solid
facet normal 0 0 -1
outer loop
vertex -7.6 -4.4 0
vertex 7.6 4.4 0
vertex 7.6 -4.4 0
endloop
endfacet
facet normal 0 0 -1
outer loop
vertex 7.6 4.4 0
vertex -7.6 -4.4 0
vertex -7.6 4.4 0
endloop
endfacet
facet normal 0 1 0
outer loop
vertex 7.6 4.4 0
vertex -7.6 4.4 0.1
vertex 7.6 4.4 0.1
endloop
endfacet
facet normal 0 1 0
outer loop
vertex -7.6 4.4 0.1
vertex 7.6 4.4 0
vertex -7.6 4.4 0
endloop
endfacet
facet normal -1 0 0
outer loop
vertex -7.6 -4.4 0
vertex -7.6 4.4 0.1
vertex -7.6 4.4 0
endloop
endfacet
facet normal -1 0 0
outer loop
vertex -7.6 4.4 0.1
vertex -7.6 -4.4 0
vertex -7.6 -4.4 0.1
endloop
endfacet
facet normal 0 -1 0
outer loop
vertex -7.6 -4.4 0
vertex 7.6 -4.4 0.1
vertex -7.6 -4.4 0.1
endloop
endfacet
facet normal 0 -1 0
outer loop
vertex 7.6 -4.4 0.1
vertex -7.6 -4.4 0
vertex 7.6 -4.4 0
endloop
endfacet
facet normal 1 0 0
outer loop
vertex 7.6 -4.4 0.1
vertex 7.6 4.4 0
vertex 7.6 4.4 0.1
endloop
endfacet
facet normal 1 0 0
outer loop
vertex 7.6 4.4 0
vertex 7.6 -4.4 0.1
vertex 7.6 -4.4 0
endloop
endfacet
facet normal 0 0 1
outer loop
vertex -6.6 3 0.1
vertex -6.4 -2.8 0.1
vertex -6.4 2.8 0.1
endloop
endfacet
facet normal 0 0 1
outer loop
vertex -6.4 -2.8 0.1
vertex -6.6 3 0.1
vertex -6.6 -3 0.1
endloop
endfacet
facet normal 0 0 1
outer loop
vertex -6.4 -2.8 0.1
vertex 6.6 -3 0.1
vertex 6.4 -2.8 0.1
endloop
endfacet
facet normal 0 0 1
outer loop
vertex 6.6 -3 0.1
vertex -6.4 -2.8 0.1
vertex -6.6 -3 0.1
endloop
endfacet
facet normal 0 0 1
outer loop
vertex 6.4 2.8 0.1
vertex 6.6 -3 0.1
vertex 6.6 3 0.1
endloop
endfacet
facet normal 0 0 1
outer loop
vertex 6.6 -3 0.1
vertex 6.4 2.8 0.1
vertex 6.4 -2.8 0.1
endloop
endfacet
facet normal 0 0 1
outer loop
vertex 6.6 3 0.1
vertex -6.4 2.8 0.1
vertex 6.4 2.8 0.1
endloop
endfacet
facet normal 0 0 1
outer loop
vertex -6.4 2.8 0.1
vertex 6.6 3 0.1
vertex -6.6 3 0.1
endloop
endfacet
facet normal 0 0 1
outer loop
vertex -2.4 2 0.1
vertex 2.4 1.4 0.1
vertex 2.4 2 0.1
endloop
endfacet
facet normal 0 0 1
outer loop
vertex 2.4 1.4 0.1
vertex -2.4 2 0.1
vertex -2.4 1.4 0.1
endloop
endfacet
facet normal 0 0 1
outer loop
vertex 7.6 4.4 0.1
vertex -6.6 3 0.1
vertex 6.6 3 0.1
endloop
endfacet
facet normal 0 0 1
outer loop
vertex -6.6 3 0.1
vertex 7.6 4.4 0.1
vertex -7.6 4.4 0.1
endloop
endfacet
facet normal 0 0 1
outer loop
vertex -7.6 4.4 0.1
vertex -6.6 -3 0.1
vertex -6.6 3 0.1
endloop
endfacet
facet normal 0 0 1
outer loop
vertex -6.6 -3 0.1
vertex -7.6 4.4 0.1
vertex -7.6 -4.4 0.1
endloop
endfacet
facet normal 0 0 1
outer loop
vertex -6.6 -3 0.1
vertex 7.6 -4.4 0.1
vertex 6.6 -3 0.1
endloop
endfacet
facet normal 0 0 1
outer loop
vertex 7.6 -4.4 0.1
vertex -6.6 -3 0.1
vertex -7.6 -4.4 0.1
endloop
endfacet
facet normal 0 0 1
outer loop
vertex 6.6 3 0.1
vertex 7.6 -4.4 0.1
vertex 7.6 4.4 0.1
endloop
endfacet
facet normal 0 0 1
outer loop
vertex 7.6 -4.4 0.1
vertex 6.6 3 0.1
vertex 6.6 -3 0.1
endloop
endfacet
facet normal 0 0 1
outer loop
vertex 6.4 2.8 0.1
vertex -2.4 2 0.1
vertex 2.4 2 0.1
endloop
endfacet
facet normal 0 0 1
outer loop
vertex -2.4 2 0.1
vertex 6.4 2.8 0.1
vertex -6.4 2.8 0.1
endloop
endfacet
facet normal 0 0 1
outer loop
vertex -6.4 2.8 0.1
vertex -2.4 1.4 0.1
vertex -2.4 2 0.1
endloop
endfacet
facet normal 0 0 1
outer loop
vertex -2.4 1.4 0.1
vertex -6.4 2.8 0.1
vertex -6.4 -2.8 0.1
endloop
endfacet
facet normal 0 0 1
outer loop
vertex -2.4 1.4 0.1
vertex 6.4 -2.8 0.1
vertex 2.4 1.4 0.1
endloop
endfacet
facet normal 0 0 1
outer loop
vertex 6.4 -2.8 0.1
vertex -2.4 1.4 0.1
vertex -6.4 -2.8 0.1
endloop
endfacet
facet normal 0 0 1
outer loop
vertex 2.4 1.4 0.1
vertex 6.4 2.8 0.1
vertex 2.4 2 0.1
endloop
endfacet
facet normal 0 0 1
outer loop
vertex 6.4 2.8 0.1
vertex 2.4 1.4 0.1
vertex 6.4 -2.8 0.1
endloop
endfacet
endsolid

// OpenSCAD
// file: ../p/box5-12.scad
use <../lib.scad>
function ldraw_lib__box5_12() = [
// 0 Box with 5 Faces without Any Edges
// 0 Name: box5-12.dat
// 0 Author: Chris Dee [cwdee]
// 0 !LDRAW_ORG Primitive UPDATE 2009-02
// 0 !LICENSE Licensed under CC BY 4.0 : see CAreadme.txt
// 
// 0 BFC CERTIFY CCW
  [0,"BFC","CERTIFY"],
  [0,"BFC","CCW"],
// 
// 0 !HISTORY 2009-09-03 [PTadmin] Official Update 2009-02
// 
// 
// 4 16 1 1 1 1 1 -1 -1 1 -1 -1 1 1
  [4,16,1,1,1,1,1,-1,-1,1,-1,-1,1,1],
// 4 16 -1 0 1 1 0 1 1 1 1 -1 1 1
  [4,16,-1,0,1,1,0,1,1,1,1,-1,1,1],
// 4 16 -1 0 -1 -1 0 1 -1 1 1 -1 1 -1
  [4,16,-1,0,-1,-1,0,1,-1,1,1,-1,1,-1],
// 4 16 1 0 -1 -1 0 -1 -1 1 -1 1 1 -1
  [4,16,1,0,-1,-1,0,-1,-1,1,-1,1,1,-1],
// 4 16 1 0 1 1 0 -1 1 1 -1 1 1 1
  [4,16,1,0,1,1,0,-1,1,1,-1,1,1,1],
// 0
];
module ldraw_lib__box5_12(step=0, col=false, unit=2/5, alt=false, line=0.2, solid=!$preview)
    makepoly(ldraw_lib__box5_12(), step=step, col=col, unit=unit, alt=alt, line=line, solid=solid);
ldraw_lib__box5_12(line=0.2);
// main file
use <../lib.scad>
use <../p/box5-12.scad>
function ldraw_lib__194325c() = [
// 0 Sticker  1.1 x  1.9 with Black Drawer on Transparent Background
// 0 Name: 194325c.dat
// 0 Author: Takeshi Takahashi [RainbowDolphin]
// 0 !LDRAW_ORG Part UPDATE 2024-08
// 0 !LICENSE Licensed under CC BY 4.0 : see CAreadme.txt
// 
// 0 BFC CERTIFY CCW
  [0,"BFC","CERTIFY"],
  [0,"BFC","CCW"],
// 
// 0 !KEYWORDS Bedroom, Kitchen, oven, set 6372
// 
// 0 !HISTORY 2024-09-30 [OrionP] Official Update 2024-08
// 
// 
// 1 16 0 -0.25 0 19 0 0 0 0.25 0 0 0 11 box5-12.dat
  [1,16,0,-0.25,0,19,0,0,0,0.25,0,0,0,11, ldraw_lib__box5_12()],
// 0 BFC NOCLIP
  [0,"BFC","NOCLIP"],
// 4 0 -16 -0.25 -7 -16 -0.25 7 -16.5 -0.25 7.5 -16.5 -0.25 -7.5
  [4,0,-16,-0.25,-7,-16,-0.25,7,-16.5,-0.25,7.5,-16.5,-0.25,-7.5],
// 4 0 16 -0.25 -7 -16 -0.25 -7 -16.5 -0.25 -7.5 16.5 -0.25 -7.5
  [4,0,16,-0.25,-7,-16,-0.25,-7,-16.5,-0.25,-7.5,16.5,-0.25,-7.5],
// 4 0 16 -0.25 7 16 -0.25 -7 16.5 -0.25 -7.5 16.5 -0.25 7.5
  [4,0,16,-0.25,7,16,-0.25,-7,16.5,-0.25,-7.5,16.5,-0.25,7.5],
// 4 0 16 -0.25 7 16.5 -0.25 7.5 -16.5 -0.25 7.5 -16 -0.25 7
  [4,0,16,-0.25,7,16.5,-0.25,7.5,-16.5,-0.25,7.5,-16,-0.25,7],
// 4 0 6 -0.25 5 -6 -0.25 5 -6 -0.25 3.5 6 -0.25 3.5
  [4,0,6,-0.25,5,-6,-0.25,5,-6,-0.25,3.5,6,-0.25,3.5],
// 0 BFC CLIP
  [0,"BFC","CLIP"],
// 4 16 16.5 -0.25 7.5 19 -0.25 11 -19 -0.25 11 -16.5 -0.25 7.5
  [4,16,16.5,-0.25,7.5,19,-0.25,11,-19,-0.25,11,-16.5,-0.25,7.5],
// 4 16 -16.5 -0.25 -7.5 -16.5 -0.25 7.5 -19 -0.25 11 -19 -0.25 -11
  [4,16,-16.5,-0.25,-7.5,-16.5,-0.25,7.5,-19,-0.25,11,-19,-0.25,-11],
// 4 16 16.5 -0.25 -7.5 -16.5 -0.25 -7.5 -19 -0.25 -11 19 -0.25 -11
  [4,16,16.5,-0.25,-7.5,-16.5,-0.25,-7.5,-19,-0.25,-11,19,-0.25,-11],
// 4 16 16.5 -0.25 7.5 16.5 -0.25 -7.5 19 -0.25 -11 19 -0.25 11
  [4,16,16.5,-0.25,7.5,16.5,-0.25,-7.5,19,-0.25,-11,19,-0.25,11],
// 4 16 6 -0.25 5 16 -0.25 7 -16 -0.25 7 -6 -0.25 5
  [4,16,6,-0.25,5,16,-0.25,7,-16,-0.25,7,-6,-0.25,5],
// 4 16 -6 -0.25 3.5 -6 -0.25 5 -16 -0.25 7 -16 -0.25 -7
  [4,16,-6,-0.25,3.5,-6,-0.25,5,-16,-0.25,7,-16,-0.25,-7],
// 4 16 6 -0.25 3.5 -6 -0.25 3.5 -16 -0.25 -7 16 -0.25 -7
  [4,16,6,-0.25,3.5,-6,-0.25,3.5,-16,-0.25,-7,16,-0.25,-7],
// 4 16 6 -0.25 5 6 -0.25 3.5 16 -0.25 -7 16 -0.25 7
  [4,16,6,-0.25,5,6,-0.25,3.5,16,-0.25,-7,16,-0.25,7],
];
module ldraw_lib__194325c(step=0, col=false, unit=2/5, alt=false, line=0.2, solid=!$preview)
    makepoly(ldraw_lib__194325c(), step=step, col=col, unit=unit, alt=alt, line=line, solid=solid);
ldraw_lib__194325c(line=0.2);
